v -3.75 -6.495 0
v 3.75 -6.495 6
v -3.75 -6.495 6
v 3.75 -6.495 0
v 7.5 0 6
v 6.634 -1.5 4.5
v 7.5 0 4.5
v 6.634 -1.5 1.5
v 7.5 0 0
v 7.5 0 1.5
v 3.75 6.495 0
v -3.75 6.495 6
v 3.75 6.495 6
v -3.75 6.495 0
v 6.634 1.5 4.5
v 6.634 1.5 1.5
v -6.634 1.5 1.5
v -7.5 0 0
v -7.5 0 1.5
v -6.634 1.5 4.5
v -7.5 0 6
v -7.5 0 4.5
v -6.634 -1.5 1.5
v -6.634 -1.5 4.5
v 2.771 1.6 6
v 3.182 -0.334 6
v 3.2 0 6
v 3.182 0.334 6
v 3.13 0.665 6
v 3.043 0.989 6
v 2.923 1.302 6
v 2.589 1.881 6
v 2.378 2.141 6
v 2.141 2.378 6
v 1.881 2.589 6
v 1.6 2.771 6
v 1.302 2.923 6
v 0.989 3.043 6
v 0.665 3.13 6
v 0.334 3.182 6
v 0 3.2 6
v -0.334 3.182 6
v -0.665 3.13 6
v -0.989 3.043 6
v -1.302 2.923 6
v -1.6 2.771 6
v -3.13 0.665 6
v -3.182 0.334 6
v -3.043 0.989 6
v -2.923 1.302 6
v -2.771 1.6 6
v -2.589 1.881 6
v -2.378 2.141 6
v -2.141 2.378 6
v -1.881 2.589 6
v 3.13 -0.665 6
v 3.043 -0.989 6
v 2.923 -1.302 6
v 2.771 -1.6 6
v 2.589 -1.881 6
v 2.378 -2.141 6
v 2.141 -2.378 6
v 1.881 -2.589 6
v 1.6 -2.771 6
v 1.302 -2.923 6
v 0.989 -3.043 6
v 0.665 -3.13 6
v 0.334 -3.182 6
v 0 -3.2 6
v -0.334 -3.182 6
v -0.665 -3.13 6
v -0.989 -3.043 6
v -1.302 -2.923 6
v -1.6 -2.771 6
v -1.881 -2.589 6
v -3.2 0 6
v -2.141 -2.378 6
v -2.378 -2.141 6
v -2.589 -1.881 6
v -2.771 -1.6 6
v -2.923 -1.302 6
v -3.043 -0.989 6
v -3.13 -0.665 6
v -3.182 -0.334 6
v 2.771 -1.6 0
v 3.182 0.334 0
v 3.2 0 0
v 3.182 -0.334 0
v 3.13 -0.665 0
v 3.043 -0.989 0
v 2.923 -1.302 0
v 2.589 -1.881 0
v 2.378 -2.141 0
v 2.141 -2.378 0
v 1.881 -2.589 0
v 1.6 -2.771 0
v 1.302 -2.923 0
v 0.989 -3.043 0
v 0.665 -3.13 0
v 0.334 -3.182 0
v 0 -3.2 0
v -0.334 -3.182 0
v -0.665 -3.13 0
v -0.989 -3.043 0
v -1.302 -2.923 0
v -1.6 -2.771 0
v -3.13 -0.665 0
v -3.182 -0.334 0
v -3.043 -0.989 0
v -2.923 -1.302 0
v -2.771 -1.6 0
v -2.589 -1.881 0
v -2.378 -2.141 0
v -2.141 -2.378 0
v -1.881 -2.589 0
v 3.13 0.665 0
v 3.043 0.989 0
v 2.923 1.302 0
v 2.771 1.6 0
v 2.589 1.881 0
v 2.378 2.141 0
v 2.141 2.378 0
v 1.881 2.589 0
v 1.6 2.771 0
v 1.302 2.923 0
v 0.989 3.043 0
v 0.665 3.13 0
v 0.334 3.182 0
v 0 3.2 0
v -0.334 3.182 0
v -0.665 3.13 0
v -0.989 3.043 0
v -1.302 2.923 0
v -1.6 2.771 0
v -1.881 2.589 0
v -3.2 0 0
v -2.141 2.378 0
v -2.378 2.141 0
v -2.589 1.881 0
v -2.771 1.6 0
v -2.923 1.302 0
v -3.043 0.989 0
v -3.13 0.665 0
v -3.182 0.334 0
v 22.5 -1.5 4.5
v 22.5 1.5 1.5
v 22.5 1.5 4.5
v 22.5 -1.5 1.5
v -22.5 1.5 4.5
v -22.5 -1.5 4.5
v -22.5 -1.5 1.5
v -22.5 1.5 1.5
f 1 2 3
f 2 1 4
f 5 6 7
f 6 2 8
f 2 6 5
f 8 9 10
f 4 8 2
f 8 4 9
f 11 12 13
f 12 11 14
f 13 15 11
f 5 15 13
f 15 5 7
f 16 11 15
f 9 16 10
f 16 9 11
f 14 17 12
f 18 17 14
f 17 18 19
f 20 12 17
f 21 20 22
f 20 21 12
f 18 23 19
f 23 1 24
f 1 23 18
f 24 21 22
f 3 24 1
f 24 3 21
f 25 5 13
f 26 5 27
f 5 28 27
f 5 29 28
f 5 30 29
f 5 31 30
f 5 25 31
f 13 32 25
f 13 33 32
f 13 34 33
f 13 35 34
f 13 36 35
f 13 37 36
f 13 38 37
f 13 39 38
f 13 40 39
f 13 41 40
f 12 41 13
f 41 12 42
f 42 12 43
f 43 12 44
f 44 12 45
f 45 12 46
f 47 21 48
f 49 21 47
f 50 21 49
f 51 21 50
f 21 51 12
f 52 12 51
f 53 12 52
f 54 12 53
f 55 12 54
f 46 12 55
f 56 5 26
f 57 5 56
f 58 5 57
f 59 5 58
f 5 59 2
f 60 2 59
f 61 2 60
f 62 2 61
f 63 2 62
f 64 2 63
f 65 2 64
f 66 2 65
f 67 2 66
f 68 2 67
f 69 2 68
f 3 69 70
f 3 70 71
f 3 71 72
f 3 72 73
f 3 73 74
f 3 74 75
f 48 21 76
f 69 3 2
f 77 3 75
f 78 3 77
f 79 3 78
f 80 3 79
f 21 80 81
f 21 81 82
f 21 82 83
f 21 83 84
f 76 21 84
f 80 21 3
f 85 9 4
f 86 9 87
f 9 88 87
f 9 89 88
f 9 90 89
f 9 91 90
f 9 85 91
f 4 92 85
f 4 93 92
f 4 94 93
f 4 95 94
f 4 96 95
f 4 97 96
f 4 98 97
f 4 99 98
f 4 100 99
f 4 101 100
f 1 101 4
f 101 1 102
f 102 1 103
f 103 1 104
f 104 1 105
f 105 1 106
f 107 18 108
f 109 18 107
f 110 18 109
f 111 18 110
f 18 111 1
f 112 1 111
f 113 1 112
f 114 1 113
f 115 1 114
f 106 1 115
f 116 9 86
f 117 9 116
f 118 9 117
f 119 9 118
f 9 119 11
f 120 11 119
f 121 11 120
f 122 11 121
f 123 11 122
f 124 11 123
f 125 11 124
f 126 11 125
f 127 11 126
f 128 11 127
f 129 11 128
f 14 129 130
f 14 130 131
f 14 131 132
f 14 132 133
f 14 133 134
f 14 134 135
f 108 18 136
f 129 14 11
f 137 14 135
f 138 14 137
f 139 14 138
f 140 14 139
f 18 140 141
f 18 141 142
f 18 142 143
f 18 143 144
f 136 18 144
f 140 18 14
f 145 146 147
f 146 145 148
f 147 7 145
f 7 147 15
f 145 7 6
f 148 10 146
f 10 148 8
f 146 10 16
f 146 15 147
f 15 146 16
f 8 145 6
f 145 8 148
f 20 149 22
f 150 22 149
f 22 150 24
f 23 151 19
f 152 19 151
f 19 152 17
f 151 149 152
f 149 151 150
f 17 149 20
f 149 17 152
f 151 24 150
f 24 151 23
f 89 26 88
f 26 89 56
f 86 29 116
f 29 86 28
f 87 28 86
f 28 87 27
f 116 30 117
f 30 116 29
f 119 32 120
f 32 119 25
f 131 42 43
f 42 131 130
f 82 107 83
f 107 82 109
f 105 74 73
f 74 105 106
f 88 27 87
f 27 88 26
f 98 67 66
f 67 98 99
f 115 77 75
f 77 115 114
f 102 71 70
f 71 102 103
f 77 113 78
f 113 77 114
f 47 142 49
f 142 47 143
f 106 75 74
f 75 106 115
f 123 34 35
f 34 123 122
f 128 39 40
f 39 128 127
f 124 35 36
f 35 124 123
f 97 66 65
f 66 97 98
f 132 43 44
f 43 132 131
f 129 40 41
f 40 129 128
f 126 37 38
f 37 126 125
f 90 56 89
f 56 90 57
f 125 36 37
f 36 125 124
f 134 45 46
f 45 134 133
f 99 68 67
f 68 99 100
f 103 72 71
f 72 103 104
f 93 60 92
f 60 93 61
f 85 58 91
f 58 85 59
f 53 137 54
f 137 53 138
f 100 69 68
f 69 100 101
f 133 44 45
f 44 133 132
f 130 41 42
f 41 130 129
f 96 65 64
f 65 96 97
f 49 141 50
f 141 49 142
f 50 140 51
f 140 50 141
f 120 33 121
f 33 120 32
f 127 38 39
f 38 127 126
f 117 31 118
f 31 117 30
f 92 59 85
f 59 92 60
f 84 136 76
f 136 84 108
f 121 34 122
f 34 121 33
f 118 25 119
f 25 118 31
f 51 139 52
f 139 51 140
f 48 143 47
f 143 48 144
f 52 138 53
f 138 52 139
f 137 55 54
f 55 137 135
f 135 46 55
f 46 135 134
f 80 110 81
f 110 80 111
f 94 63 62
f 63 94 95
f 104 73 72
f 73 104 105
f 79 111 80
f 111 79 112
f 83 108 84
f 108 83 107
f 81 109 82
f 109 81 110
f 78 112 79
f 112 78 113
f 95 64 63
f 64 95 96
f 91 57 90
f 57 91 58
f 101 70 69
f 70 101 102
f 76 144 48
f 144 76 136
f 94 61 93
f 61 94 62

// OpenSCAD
// Wing nut with two reinforced wings.
$fn = 60;
eps = 0.02;
thread_d = 6.4;
body_d = 15;
body_h = 6;
wing_l = 16;
wing_t = 3;
difference() {
    union() {
        cylinder(d = body_d, h = body_h, $fn = 6);
        translate([body_d / 2 - 1, -wing_t / 2, body_h / 2 - wing_t / 2]) cube([wing_l, wing_t, wing_t]);
        translate([-body_d / 2 - wing_l + 1, -wing_t / 2, body_h / 2 - wing_t / 2]) cube([wing_l, wing_t, wing_t]);
    }
    translate([0, 0, -eps]) cylinder(d = thread_d, h = body_h + 2 * eps);
}
